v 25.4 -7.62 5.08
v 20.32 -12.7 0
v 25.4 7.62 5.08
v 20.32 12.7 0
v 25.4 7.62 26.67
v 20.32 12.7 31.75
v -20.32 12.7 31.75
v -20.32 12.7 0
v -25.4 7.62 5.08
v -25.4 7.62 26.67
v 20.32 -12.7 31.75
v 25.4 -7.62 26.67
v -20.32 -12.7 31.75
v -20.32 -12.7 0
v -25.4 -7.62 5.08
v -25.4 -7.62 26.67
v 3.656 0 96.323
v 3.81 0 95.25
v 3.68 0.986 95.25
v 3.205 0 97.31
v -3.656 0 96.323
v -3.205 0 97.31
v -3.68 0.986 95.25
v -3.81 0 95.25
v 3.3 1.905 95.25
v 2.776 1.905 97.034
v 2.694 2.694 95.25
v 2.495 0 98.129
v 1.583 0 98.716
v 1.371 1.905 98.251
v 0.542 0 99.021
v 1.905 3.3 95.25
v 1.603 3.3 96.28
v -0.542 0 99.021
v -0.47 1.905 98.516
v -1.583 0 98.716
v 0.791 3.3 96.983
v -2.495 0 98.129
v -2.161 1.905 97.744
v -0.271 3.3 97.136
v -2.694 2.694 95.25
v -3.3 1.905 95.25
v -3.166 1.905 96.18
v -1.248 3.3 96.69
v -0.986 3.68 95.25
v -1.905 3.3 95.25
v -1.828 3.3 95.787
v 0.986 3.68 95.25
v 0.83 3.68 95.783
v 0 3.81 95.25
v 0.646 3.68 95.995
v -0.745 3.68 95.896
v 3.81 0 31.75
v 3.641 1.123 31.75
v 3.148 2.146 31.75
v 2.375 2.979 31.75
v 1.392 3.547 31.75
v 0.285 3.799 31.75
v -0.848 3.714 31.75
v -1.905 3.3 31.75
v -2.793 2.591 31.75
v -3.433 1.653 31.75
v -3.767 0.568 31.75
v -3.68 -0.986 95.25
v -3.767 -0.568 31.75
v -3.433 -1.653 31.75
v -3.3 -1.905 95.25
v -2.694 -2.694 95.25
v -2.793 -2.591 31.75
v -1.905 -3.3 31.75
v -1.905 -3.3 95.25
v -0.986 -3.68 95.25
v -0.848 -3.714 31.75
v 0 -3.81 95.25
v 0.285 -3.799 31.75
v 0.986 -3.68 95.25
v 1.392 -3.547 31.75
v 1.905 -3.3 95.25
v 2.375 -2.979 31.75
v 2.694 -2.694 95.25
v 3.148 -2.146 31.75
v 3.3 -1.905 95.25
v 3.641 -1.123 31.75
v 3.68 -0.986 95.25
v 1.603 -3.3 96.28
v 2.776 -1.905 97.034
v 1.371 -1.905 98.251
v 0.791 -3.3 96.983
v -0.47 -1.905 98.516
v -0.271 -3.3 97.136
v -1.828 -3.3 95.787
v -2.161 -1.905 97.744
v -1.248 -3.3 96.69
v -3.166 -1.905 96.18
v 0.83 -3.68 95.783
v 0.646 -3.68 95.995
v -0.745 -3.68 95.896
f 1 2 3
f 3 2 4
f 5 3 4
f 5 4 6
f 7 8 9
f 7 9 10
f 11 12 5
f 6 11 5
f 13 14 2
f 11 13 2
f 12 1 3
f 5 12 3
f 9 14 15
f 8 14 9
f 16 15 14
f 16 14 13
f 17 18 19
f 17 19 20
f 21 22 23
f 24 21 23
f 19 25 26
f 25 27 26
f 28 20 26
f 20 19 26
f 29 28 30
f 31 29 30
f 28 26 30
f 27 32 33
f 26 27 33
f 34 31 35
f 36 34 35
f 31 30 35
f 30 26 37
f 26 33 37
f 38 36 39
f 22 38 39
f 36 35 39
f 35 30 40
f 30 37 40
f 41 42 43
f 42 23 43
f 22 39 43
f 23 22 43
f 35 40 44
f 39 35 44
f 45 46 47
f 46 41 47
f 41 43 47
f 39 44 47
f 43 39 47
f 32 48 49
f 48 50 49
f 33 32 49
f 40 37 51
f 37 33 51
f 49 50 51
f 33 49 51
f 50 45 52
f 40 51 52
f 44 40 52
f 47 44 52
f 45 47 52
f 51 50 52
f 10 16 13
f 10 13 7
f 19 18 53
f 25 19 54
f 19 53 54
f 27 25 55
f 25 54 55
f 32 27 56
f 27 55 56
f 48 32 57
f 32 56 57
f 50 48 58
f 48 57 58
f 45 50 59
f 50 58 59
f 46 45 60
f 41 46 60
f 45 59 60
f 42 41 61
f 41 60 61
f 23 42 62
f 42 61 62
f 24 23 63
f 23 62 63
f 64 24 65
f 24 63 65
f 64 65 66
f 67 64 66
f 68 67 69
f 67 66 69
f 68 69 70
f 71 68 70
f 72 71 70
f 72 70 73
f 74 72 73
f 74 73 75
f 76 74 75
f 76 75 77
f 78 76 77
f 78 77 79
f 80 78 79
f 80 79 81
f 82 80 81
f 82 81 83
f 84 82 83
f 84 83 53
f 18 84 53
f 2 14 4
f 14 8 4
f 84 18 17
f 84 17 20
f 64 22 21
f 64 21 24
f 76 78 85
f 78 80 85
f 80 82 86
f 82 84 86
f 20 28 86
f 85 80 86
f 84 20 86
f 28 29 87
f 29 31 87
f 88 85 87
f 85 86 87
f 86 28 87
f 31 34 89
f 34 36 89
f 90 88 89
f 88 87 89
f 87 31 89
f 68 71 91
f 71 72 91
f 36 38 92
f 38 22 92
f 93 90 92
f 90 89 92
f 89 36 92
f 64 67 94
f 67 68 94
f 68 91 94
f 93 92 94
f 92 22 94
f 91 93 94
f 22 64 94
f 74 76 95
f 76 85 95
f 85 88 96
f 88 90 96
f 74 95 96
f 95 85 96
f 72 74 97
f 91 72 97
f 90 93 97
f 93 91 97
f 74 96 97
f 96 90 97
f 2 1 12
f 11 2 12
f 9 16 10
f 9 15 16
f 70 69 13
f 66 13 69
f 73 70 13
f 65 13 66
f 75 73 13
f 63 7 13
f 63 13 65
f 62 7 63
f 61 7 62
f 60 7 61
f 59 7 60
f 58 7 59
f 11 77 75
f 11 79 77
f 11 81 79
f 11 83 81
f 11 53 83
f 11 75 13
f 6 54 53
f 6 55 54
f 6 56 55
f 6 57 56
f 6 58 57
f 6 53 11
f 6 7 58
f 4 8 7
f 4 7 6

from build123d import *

# Parameters (mm, degrees)
F0_W     = 50.8
F0_H     = 25.4
F1_DEPTH = 31.75
F2_R     = 3.81
F3_DEPTH = 63.5
F6_SIZE  = 5.08
F7_SIZE  = 5.08


with BuildPart() as f1:
    # F0 (on Top) → F1 (new body)
    with BuildSketch(Plane.XY):
        Rectangle(F0_W, F0_H)
    extrude(amount=F1_DEPTH)

    # F2 (on face) → F3 (join)
    with BuildSketch(Plane.XY.offset(31.75)):
        Circle(F2_R)
    extrude(amount=F3_DEPTH)

    # F4 (on face) → F5 (revolve)
    with BuildSketch(Plane.XY.offset(95.25)):
        with BuildLine():
            Line((0, 3.81), (0, -3.81))
            ThreePointArc((0, -3.81), (2.694077, -2.694077), (3.81, 0))
            ThreePointArc((3.81, 0), (2.694077, 2.694077), (0, 3.81))
        make_face()
    revolve(axis=Axis((0, 0, 95.25), (0, -1, 0)))

    # F6
    f6_edges = [f1.edges().sort_by_distance(p)[0] for p in [
        (25.4, 0, 0),
        (25.4, 12.7, 15.875),
        (25.4, 0, 31.75),
        (25.4, -12.7, 15.875),
    ]]
    chamfer(f6_edges, length=F6_SIZE)

    # F7
    f7_edges = [f1.edges().sort_by_distance(p)[0] for p in [
        (-25.4, 0, 31.75),
        (-25.4, 12.7, 15.875),
        (-25.4, -12.7, 15.875),
        (-25.4, 0, 0),
    ]]
    chamfer(f7_edges, length=F7_SIZE)


solid = f1.part
